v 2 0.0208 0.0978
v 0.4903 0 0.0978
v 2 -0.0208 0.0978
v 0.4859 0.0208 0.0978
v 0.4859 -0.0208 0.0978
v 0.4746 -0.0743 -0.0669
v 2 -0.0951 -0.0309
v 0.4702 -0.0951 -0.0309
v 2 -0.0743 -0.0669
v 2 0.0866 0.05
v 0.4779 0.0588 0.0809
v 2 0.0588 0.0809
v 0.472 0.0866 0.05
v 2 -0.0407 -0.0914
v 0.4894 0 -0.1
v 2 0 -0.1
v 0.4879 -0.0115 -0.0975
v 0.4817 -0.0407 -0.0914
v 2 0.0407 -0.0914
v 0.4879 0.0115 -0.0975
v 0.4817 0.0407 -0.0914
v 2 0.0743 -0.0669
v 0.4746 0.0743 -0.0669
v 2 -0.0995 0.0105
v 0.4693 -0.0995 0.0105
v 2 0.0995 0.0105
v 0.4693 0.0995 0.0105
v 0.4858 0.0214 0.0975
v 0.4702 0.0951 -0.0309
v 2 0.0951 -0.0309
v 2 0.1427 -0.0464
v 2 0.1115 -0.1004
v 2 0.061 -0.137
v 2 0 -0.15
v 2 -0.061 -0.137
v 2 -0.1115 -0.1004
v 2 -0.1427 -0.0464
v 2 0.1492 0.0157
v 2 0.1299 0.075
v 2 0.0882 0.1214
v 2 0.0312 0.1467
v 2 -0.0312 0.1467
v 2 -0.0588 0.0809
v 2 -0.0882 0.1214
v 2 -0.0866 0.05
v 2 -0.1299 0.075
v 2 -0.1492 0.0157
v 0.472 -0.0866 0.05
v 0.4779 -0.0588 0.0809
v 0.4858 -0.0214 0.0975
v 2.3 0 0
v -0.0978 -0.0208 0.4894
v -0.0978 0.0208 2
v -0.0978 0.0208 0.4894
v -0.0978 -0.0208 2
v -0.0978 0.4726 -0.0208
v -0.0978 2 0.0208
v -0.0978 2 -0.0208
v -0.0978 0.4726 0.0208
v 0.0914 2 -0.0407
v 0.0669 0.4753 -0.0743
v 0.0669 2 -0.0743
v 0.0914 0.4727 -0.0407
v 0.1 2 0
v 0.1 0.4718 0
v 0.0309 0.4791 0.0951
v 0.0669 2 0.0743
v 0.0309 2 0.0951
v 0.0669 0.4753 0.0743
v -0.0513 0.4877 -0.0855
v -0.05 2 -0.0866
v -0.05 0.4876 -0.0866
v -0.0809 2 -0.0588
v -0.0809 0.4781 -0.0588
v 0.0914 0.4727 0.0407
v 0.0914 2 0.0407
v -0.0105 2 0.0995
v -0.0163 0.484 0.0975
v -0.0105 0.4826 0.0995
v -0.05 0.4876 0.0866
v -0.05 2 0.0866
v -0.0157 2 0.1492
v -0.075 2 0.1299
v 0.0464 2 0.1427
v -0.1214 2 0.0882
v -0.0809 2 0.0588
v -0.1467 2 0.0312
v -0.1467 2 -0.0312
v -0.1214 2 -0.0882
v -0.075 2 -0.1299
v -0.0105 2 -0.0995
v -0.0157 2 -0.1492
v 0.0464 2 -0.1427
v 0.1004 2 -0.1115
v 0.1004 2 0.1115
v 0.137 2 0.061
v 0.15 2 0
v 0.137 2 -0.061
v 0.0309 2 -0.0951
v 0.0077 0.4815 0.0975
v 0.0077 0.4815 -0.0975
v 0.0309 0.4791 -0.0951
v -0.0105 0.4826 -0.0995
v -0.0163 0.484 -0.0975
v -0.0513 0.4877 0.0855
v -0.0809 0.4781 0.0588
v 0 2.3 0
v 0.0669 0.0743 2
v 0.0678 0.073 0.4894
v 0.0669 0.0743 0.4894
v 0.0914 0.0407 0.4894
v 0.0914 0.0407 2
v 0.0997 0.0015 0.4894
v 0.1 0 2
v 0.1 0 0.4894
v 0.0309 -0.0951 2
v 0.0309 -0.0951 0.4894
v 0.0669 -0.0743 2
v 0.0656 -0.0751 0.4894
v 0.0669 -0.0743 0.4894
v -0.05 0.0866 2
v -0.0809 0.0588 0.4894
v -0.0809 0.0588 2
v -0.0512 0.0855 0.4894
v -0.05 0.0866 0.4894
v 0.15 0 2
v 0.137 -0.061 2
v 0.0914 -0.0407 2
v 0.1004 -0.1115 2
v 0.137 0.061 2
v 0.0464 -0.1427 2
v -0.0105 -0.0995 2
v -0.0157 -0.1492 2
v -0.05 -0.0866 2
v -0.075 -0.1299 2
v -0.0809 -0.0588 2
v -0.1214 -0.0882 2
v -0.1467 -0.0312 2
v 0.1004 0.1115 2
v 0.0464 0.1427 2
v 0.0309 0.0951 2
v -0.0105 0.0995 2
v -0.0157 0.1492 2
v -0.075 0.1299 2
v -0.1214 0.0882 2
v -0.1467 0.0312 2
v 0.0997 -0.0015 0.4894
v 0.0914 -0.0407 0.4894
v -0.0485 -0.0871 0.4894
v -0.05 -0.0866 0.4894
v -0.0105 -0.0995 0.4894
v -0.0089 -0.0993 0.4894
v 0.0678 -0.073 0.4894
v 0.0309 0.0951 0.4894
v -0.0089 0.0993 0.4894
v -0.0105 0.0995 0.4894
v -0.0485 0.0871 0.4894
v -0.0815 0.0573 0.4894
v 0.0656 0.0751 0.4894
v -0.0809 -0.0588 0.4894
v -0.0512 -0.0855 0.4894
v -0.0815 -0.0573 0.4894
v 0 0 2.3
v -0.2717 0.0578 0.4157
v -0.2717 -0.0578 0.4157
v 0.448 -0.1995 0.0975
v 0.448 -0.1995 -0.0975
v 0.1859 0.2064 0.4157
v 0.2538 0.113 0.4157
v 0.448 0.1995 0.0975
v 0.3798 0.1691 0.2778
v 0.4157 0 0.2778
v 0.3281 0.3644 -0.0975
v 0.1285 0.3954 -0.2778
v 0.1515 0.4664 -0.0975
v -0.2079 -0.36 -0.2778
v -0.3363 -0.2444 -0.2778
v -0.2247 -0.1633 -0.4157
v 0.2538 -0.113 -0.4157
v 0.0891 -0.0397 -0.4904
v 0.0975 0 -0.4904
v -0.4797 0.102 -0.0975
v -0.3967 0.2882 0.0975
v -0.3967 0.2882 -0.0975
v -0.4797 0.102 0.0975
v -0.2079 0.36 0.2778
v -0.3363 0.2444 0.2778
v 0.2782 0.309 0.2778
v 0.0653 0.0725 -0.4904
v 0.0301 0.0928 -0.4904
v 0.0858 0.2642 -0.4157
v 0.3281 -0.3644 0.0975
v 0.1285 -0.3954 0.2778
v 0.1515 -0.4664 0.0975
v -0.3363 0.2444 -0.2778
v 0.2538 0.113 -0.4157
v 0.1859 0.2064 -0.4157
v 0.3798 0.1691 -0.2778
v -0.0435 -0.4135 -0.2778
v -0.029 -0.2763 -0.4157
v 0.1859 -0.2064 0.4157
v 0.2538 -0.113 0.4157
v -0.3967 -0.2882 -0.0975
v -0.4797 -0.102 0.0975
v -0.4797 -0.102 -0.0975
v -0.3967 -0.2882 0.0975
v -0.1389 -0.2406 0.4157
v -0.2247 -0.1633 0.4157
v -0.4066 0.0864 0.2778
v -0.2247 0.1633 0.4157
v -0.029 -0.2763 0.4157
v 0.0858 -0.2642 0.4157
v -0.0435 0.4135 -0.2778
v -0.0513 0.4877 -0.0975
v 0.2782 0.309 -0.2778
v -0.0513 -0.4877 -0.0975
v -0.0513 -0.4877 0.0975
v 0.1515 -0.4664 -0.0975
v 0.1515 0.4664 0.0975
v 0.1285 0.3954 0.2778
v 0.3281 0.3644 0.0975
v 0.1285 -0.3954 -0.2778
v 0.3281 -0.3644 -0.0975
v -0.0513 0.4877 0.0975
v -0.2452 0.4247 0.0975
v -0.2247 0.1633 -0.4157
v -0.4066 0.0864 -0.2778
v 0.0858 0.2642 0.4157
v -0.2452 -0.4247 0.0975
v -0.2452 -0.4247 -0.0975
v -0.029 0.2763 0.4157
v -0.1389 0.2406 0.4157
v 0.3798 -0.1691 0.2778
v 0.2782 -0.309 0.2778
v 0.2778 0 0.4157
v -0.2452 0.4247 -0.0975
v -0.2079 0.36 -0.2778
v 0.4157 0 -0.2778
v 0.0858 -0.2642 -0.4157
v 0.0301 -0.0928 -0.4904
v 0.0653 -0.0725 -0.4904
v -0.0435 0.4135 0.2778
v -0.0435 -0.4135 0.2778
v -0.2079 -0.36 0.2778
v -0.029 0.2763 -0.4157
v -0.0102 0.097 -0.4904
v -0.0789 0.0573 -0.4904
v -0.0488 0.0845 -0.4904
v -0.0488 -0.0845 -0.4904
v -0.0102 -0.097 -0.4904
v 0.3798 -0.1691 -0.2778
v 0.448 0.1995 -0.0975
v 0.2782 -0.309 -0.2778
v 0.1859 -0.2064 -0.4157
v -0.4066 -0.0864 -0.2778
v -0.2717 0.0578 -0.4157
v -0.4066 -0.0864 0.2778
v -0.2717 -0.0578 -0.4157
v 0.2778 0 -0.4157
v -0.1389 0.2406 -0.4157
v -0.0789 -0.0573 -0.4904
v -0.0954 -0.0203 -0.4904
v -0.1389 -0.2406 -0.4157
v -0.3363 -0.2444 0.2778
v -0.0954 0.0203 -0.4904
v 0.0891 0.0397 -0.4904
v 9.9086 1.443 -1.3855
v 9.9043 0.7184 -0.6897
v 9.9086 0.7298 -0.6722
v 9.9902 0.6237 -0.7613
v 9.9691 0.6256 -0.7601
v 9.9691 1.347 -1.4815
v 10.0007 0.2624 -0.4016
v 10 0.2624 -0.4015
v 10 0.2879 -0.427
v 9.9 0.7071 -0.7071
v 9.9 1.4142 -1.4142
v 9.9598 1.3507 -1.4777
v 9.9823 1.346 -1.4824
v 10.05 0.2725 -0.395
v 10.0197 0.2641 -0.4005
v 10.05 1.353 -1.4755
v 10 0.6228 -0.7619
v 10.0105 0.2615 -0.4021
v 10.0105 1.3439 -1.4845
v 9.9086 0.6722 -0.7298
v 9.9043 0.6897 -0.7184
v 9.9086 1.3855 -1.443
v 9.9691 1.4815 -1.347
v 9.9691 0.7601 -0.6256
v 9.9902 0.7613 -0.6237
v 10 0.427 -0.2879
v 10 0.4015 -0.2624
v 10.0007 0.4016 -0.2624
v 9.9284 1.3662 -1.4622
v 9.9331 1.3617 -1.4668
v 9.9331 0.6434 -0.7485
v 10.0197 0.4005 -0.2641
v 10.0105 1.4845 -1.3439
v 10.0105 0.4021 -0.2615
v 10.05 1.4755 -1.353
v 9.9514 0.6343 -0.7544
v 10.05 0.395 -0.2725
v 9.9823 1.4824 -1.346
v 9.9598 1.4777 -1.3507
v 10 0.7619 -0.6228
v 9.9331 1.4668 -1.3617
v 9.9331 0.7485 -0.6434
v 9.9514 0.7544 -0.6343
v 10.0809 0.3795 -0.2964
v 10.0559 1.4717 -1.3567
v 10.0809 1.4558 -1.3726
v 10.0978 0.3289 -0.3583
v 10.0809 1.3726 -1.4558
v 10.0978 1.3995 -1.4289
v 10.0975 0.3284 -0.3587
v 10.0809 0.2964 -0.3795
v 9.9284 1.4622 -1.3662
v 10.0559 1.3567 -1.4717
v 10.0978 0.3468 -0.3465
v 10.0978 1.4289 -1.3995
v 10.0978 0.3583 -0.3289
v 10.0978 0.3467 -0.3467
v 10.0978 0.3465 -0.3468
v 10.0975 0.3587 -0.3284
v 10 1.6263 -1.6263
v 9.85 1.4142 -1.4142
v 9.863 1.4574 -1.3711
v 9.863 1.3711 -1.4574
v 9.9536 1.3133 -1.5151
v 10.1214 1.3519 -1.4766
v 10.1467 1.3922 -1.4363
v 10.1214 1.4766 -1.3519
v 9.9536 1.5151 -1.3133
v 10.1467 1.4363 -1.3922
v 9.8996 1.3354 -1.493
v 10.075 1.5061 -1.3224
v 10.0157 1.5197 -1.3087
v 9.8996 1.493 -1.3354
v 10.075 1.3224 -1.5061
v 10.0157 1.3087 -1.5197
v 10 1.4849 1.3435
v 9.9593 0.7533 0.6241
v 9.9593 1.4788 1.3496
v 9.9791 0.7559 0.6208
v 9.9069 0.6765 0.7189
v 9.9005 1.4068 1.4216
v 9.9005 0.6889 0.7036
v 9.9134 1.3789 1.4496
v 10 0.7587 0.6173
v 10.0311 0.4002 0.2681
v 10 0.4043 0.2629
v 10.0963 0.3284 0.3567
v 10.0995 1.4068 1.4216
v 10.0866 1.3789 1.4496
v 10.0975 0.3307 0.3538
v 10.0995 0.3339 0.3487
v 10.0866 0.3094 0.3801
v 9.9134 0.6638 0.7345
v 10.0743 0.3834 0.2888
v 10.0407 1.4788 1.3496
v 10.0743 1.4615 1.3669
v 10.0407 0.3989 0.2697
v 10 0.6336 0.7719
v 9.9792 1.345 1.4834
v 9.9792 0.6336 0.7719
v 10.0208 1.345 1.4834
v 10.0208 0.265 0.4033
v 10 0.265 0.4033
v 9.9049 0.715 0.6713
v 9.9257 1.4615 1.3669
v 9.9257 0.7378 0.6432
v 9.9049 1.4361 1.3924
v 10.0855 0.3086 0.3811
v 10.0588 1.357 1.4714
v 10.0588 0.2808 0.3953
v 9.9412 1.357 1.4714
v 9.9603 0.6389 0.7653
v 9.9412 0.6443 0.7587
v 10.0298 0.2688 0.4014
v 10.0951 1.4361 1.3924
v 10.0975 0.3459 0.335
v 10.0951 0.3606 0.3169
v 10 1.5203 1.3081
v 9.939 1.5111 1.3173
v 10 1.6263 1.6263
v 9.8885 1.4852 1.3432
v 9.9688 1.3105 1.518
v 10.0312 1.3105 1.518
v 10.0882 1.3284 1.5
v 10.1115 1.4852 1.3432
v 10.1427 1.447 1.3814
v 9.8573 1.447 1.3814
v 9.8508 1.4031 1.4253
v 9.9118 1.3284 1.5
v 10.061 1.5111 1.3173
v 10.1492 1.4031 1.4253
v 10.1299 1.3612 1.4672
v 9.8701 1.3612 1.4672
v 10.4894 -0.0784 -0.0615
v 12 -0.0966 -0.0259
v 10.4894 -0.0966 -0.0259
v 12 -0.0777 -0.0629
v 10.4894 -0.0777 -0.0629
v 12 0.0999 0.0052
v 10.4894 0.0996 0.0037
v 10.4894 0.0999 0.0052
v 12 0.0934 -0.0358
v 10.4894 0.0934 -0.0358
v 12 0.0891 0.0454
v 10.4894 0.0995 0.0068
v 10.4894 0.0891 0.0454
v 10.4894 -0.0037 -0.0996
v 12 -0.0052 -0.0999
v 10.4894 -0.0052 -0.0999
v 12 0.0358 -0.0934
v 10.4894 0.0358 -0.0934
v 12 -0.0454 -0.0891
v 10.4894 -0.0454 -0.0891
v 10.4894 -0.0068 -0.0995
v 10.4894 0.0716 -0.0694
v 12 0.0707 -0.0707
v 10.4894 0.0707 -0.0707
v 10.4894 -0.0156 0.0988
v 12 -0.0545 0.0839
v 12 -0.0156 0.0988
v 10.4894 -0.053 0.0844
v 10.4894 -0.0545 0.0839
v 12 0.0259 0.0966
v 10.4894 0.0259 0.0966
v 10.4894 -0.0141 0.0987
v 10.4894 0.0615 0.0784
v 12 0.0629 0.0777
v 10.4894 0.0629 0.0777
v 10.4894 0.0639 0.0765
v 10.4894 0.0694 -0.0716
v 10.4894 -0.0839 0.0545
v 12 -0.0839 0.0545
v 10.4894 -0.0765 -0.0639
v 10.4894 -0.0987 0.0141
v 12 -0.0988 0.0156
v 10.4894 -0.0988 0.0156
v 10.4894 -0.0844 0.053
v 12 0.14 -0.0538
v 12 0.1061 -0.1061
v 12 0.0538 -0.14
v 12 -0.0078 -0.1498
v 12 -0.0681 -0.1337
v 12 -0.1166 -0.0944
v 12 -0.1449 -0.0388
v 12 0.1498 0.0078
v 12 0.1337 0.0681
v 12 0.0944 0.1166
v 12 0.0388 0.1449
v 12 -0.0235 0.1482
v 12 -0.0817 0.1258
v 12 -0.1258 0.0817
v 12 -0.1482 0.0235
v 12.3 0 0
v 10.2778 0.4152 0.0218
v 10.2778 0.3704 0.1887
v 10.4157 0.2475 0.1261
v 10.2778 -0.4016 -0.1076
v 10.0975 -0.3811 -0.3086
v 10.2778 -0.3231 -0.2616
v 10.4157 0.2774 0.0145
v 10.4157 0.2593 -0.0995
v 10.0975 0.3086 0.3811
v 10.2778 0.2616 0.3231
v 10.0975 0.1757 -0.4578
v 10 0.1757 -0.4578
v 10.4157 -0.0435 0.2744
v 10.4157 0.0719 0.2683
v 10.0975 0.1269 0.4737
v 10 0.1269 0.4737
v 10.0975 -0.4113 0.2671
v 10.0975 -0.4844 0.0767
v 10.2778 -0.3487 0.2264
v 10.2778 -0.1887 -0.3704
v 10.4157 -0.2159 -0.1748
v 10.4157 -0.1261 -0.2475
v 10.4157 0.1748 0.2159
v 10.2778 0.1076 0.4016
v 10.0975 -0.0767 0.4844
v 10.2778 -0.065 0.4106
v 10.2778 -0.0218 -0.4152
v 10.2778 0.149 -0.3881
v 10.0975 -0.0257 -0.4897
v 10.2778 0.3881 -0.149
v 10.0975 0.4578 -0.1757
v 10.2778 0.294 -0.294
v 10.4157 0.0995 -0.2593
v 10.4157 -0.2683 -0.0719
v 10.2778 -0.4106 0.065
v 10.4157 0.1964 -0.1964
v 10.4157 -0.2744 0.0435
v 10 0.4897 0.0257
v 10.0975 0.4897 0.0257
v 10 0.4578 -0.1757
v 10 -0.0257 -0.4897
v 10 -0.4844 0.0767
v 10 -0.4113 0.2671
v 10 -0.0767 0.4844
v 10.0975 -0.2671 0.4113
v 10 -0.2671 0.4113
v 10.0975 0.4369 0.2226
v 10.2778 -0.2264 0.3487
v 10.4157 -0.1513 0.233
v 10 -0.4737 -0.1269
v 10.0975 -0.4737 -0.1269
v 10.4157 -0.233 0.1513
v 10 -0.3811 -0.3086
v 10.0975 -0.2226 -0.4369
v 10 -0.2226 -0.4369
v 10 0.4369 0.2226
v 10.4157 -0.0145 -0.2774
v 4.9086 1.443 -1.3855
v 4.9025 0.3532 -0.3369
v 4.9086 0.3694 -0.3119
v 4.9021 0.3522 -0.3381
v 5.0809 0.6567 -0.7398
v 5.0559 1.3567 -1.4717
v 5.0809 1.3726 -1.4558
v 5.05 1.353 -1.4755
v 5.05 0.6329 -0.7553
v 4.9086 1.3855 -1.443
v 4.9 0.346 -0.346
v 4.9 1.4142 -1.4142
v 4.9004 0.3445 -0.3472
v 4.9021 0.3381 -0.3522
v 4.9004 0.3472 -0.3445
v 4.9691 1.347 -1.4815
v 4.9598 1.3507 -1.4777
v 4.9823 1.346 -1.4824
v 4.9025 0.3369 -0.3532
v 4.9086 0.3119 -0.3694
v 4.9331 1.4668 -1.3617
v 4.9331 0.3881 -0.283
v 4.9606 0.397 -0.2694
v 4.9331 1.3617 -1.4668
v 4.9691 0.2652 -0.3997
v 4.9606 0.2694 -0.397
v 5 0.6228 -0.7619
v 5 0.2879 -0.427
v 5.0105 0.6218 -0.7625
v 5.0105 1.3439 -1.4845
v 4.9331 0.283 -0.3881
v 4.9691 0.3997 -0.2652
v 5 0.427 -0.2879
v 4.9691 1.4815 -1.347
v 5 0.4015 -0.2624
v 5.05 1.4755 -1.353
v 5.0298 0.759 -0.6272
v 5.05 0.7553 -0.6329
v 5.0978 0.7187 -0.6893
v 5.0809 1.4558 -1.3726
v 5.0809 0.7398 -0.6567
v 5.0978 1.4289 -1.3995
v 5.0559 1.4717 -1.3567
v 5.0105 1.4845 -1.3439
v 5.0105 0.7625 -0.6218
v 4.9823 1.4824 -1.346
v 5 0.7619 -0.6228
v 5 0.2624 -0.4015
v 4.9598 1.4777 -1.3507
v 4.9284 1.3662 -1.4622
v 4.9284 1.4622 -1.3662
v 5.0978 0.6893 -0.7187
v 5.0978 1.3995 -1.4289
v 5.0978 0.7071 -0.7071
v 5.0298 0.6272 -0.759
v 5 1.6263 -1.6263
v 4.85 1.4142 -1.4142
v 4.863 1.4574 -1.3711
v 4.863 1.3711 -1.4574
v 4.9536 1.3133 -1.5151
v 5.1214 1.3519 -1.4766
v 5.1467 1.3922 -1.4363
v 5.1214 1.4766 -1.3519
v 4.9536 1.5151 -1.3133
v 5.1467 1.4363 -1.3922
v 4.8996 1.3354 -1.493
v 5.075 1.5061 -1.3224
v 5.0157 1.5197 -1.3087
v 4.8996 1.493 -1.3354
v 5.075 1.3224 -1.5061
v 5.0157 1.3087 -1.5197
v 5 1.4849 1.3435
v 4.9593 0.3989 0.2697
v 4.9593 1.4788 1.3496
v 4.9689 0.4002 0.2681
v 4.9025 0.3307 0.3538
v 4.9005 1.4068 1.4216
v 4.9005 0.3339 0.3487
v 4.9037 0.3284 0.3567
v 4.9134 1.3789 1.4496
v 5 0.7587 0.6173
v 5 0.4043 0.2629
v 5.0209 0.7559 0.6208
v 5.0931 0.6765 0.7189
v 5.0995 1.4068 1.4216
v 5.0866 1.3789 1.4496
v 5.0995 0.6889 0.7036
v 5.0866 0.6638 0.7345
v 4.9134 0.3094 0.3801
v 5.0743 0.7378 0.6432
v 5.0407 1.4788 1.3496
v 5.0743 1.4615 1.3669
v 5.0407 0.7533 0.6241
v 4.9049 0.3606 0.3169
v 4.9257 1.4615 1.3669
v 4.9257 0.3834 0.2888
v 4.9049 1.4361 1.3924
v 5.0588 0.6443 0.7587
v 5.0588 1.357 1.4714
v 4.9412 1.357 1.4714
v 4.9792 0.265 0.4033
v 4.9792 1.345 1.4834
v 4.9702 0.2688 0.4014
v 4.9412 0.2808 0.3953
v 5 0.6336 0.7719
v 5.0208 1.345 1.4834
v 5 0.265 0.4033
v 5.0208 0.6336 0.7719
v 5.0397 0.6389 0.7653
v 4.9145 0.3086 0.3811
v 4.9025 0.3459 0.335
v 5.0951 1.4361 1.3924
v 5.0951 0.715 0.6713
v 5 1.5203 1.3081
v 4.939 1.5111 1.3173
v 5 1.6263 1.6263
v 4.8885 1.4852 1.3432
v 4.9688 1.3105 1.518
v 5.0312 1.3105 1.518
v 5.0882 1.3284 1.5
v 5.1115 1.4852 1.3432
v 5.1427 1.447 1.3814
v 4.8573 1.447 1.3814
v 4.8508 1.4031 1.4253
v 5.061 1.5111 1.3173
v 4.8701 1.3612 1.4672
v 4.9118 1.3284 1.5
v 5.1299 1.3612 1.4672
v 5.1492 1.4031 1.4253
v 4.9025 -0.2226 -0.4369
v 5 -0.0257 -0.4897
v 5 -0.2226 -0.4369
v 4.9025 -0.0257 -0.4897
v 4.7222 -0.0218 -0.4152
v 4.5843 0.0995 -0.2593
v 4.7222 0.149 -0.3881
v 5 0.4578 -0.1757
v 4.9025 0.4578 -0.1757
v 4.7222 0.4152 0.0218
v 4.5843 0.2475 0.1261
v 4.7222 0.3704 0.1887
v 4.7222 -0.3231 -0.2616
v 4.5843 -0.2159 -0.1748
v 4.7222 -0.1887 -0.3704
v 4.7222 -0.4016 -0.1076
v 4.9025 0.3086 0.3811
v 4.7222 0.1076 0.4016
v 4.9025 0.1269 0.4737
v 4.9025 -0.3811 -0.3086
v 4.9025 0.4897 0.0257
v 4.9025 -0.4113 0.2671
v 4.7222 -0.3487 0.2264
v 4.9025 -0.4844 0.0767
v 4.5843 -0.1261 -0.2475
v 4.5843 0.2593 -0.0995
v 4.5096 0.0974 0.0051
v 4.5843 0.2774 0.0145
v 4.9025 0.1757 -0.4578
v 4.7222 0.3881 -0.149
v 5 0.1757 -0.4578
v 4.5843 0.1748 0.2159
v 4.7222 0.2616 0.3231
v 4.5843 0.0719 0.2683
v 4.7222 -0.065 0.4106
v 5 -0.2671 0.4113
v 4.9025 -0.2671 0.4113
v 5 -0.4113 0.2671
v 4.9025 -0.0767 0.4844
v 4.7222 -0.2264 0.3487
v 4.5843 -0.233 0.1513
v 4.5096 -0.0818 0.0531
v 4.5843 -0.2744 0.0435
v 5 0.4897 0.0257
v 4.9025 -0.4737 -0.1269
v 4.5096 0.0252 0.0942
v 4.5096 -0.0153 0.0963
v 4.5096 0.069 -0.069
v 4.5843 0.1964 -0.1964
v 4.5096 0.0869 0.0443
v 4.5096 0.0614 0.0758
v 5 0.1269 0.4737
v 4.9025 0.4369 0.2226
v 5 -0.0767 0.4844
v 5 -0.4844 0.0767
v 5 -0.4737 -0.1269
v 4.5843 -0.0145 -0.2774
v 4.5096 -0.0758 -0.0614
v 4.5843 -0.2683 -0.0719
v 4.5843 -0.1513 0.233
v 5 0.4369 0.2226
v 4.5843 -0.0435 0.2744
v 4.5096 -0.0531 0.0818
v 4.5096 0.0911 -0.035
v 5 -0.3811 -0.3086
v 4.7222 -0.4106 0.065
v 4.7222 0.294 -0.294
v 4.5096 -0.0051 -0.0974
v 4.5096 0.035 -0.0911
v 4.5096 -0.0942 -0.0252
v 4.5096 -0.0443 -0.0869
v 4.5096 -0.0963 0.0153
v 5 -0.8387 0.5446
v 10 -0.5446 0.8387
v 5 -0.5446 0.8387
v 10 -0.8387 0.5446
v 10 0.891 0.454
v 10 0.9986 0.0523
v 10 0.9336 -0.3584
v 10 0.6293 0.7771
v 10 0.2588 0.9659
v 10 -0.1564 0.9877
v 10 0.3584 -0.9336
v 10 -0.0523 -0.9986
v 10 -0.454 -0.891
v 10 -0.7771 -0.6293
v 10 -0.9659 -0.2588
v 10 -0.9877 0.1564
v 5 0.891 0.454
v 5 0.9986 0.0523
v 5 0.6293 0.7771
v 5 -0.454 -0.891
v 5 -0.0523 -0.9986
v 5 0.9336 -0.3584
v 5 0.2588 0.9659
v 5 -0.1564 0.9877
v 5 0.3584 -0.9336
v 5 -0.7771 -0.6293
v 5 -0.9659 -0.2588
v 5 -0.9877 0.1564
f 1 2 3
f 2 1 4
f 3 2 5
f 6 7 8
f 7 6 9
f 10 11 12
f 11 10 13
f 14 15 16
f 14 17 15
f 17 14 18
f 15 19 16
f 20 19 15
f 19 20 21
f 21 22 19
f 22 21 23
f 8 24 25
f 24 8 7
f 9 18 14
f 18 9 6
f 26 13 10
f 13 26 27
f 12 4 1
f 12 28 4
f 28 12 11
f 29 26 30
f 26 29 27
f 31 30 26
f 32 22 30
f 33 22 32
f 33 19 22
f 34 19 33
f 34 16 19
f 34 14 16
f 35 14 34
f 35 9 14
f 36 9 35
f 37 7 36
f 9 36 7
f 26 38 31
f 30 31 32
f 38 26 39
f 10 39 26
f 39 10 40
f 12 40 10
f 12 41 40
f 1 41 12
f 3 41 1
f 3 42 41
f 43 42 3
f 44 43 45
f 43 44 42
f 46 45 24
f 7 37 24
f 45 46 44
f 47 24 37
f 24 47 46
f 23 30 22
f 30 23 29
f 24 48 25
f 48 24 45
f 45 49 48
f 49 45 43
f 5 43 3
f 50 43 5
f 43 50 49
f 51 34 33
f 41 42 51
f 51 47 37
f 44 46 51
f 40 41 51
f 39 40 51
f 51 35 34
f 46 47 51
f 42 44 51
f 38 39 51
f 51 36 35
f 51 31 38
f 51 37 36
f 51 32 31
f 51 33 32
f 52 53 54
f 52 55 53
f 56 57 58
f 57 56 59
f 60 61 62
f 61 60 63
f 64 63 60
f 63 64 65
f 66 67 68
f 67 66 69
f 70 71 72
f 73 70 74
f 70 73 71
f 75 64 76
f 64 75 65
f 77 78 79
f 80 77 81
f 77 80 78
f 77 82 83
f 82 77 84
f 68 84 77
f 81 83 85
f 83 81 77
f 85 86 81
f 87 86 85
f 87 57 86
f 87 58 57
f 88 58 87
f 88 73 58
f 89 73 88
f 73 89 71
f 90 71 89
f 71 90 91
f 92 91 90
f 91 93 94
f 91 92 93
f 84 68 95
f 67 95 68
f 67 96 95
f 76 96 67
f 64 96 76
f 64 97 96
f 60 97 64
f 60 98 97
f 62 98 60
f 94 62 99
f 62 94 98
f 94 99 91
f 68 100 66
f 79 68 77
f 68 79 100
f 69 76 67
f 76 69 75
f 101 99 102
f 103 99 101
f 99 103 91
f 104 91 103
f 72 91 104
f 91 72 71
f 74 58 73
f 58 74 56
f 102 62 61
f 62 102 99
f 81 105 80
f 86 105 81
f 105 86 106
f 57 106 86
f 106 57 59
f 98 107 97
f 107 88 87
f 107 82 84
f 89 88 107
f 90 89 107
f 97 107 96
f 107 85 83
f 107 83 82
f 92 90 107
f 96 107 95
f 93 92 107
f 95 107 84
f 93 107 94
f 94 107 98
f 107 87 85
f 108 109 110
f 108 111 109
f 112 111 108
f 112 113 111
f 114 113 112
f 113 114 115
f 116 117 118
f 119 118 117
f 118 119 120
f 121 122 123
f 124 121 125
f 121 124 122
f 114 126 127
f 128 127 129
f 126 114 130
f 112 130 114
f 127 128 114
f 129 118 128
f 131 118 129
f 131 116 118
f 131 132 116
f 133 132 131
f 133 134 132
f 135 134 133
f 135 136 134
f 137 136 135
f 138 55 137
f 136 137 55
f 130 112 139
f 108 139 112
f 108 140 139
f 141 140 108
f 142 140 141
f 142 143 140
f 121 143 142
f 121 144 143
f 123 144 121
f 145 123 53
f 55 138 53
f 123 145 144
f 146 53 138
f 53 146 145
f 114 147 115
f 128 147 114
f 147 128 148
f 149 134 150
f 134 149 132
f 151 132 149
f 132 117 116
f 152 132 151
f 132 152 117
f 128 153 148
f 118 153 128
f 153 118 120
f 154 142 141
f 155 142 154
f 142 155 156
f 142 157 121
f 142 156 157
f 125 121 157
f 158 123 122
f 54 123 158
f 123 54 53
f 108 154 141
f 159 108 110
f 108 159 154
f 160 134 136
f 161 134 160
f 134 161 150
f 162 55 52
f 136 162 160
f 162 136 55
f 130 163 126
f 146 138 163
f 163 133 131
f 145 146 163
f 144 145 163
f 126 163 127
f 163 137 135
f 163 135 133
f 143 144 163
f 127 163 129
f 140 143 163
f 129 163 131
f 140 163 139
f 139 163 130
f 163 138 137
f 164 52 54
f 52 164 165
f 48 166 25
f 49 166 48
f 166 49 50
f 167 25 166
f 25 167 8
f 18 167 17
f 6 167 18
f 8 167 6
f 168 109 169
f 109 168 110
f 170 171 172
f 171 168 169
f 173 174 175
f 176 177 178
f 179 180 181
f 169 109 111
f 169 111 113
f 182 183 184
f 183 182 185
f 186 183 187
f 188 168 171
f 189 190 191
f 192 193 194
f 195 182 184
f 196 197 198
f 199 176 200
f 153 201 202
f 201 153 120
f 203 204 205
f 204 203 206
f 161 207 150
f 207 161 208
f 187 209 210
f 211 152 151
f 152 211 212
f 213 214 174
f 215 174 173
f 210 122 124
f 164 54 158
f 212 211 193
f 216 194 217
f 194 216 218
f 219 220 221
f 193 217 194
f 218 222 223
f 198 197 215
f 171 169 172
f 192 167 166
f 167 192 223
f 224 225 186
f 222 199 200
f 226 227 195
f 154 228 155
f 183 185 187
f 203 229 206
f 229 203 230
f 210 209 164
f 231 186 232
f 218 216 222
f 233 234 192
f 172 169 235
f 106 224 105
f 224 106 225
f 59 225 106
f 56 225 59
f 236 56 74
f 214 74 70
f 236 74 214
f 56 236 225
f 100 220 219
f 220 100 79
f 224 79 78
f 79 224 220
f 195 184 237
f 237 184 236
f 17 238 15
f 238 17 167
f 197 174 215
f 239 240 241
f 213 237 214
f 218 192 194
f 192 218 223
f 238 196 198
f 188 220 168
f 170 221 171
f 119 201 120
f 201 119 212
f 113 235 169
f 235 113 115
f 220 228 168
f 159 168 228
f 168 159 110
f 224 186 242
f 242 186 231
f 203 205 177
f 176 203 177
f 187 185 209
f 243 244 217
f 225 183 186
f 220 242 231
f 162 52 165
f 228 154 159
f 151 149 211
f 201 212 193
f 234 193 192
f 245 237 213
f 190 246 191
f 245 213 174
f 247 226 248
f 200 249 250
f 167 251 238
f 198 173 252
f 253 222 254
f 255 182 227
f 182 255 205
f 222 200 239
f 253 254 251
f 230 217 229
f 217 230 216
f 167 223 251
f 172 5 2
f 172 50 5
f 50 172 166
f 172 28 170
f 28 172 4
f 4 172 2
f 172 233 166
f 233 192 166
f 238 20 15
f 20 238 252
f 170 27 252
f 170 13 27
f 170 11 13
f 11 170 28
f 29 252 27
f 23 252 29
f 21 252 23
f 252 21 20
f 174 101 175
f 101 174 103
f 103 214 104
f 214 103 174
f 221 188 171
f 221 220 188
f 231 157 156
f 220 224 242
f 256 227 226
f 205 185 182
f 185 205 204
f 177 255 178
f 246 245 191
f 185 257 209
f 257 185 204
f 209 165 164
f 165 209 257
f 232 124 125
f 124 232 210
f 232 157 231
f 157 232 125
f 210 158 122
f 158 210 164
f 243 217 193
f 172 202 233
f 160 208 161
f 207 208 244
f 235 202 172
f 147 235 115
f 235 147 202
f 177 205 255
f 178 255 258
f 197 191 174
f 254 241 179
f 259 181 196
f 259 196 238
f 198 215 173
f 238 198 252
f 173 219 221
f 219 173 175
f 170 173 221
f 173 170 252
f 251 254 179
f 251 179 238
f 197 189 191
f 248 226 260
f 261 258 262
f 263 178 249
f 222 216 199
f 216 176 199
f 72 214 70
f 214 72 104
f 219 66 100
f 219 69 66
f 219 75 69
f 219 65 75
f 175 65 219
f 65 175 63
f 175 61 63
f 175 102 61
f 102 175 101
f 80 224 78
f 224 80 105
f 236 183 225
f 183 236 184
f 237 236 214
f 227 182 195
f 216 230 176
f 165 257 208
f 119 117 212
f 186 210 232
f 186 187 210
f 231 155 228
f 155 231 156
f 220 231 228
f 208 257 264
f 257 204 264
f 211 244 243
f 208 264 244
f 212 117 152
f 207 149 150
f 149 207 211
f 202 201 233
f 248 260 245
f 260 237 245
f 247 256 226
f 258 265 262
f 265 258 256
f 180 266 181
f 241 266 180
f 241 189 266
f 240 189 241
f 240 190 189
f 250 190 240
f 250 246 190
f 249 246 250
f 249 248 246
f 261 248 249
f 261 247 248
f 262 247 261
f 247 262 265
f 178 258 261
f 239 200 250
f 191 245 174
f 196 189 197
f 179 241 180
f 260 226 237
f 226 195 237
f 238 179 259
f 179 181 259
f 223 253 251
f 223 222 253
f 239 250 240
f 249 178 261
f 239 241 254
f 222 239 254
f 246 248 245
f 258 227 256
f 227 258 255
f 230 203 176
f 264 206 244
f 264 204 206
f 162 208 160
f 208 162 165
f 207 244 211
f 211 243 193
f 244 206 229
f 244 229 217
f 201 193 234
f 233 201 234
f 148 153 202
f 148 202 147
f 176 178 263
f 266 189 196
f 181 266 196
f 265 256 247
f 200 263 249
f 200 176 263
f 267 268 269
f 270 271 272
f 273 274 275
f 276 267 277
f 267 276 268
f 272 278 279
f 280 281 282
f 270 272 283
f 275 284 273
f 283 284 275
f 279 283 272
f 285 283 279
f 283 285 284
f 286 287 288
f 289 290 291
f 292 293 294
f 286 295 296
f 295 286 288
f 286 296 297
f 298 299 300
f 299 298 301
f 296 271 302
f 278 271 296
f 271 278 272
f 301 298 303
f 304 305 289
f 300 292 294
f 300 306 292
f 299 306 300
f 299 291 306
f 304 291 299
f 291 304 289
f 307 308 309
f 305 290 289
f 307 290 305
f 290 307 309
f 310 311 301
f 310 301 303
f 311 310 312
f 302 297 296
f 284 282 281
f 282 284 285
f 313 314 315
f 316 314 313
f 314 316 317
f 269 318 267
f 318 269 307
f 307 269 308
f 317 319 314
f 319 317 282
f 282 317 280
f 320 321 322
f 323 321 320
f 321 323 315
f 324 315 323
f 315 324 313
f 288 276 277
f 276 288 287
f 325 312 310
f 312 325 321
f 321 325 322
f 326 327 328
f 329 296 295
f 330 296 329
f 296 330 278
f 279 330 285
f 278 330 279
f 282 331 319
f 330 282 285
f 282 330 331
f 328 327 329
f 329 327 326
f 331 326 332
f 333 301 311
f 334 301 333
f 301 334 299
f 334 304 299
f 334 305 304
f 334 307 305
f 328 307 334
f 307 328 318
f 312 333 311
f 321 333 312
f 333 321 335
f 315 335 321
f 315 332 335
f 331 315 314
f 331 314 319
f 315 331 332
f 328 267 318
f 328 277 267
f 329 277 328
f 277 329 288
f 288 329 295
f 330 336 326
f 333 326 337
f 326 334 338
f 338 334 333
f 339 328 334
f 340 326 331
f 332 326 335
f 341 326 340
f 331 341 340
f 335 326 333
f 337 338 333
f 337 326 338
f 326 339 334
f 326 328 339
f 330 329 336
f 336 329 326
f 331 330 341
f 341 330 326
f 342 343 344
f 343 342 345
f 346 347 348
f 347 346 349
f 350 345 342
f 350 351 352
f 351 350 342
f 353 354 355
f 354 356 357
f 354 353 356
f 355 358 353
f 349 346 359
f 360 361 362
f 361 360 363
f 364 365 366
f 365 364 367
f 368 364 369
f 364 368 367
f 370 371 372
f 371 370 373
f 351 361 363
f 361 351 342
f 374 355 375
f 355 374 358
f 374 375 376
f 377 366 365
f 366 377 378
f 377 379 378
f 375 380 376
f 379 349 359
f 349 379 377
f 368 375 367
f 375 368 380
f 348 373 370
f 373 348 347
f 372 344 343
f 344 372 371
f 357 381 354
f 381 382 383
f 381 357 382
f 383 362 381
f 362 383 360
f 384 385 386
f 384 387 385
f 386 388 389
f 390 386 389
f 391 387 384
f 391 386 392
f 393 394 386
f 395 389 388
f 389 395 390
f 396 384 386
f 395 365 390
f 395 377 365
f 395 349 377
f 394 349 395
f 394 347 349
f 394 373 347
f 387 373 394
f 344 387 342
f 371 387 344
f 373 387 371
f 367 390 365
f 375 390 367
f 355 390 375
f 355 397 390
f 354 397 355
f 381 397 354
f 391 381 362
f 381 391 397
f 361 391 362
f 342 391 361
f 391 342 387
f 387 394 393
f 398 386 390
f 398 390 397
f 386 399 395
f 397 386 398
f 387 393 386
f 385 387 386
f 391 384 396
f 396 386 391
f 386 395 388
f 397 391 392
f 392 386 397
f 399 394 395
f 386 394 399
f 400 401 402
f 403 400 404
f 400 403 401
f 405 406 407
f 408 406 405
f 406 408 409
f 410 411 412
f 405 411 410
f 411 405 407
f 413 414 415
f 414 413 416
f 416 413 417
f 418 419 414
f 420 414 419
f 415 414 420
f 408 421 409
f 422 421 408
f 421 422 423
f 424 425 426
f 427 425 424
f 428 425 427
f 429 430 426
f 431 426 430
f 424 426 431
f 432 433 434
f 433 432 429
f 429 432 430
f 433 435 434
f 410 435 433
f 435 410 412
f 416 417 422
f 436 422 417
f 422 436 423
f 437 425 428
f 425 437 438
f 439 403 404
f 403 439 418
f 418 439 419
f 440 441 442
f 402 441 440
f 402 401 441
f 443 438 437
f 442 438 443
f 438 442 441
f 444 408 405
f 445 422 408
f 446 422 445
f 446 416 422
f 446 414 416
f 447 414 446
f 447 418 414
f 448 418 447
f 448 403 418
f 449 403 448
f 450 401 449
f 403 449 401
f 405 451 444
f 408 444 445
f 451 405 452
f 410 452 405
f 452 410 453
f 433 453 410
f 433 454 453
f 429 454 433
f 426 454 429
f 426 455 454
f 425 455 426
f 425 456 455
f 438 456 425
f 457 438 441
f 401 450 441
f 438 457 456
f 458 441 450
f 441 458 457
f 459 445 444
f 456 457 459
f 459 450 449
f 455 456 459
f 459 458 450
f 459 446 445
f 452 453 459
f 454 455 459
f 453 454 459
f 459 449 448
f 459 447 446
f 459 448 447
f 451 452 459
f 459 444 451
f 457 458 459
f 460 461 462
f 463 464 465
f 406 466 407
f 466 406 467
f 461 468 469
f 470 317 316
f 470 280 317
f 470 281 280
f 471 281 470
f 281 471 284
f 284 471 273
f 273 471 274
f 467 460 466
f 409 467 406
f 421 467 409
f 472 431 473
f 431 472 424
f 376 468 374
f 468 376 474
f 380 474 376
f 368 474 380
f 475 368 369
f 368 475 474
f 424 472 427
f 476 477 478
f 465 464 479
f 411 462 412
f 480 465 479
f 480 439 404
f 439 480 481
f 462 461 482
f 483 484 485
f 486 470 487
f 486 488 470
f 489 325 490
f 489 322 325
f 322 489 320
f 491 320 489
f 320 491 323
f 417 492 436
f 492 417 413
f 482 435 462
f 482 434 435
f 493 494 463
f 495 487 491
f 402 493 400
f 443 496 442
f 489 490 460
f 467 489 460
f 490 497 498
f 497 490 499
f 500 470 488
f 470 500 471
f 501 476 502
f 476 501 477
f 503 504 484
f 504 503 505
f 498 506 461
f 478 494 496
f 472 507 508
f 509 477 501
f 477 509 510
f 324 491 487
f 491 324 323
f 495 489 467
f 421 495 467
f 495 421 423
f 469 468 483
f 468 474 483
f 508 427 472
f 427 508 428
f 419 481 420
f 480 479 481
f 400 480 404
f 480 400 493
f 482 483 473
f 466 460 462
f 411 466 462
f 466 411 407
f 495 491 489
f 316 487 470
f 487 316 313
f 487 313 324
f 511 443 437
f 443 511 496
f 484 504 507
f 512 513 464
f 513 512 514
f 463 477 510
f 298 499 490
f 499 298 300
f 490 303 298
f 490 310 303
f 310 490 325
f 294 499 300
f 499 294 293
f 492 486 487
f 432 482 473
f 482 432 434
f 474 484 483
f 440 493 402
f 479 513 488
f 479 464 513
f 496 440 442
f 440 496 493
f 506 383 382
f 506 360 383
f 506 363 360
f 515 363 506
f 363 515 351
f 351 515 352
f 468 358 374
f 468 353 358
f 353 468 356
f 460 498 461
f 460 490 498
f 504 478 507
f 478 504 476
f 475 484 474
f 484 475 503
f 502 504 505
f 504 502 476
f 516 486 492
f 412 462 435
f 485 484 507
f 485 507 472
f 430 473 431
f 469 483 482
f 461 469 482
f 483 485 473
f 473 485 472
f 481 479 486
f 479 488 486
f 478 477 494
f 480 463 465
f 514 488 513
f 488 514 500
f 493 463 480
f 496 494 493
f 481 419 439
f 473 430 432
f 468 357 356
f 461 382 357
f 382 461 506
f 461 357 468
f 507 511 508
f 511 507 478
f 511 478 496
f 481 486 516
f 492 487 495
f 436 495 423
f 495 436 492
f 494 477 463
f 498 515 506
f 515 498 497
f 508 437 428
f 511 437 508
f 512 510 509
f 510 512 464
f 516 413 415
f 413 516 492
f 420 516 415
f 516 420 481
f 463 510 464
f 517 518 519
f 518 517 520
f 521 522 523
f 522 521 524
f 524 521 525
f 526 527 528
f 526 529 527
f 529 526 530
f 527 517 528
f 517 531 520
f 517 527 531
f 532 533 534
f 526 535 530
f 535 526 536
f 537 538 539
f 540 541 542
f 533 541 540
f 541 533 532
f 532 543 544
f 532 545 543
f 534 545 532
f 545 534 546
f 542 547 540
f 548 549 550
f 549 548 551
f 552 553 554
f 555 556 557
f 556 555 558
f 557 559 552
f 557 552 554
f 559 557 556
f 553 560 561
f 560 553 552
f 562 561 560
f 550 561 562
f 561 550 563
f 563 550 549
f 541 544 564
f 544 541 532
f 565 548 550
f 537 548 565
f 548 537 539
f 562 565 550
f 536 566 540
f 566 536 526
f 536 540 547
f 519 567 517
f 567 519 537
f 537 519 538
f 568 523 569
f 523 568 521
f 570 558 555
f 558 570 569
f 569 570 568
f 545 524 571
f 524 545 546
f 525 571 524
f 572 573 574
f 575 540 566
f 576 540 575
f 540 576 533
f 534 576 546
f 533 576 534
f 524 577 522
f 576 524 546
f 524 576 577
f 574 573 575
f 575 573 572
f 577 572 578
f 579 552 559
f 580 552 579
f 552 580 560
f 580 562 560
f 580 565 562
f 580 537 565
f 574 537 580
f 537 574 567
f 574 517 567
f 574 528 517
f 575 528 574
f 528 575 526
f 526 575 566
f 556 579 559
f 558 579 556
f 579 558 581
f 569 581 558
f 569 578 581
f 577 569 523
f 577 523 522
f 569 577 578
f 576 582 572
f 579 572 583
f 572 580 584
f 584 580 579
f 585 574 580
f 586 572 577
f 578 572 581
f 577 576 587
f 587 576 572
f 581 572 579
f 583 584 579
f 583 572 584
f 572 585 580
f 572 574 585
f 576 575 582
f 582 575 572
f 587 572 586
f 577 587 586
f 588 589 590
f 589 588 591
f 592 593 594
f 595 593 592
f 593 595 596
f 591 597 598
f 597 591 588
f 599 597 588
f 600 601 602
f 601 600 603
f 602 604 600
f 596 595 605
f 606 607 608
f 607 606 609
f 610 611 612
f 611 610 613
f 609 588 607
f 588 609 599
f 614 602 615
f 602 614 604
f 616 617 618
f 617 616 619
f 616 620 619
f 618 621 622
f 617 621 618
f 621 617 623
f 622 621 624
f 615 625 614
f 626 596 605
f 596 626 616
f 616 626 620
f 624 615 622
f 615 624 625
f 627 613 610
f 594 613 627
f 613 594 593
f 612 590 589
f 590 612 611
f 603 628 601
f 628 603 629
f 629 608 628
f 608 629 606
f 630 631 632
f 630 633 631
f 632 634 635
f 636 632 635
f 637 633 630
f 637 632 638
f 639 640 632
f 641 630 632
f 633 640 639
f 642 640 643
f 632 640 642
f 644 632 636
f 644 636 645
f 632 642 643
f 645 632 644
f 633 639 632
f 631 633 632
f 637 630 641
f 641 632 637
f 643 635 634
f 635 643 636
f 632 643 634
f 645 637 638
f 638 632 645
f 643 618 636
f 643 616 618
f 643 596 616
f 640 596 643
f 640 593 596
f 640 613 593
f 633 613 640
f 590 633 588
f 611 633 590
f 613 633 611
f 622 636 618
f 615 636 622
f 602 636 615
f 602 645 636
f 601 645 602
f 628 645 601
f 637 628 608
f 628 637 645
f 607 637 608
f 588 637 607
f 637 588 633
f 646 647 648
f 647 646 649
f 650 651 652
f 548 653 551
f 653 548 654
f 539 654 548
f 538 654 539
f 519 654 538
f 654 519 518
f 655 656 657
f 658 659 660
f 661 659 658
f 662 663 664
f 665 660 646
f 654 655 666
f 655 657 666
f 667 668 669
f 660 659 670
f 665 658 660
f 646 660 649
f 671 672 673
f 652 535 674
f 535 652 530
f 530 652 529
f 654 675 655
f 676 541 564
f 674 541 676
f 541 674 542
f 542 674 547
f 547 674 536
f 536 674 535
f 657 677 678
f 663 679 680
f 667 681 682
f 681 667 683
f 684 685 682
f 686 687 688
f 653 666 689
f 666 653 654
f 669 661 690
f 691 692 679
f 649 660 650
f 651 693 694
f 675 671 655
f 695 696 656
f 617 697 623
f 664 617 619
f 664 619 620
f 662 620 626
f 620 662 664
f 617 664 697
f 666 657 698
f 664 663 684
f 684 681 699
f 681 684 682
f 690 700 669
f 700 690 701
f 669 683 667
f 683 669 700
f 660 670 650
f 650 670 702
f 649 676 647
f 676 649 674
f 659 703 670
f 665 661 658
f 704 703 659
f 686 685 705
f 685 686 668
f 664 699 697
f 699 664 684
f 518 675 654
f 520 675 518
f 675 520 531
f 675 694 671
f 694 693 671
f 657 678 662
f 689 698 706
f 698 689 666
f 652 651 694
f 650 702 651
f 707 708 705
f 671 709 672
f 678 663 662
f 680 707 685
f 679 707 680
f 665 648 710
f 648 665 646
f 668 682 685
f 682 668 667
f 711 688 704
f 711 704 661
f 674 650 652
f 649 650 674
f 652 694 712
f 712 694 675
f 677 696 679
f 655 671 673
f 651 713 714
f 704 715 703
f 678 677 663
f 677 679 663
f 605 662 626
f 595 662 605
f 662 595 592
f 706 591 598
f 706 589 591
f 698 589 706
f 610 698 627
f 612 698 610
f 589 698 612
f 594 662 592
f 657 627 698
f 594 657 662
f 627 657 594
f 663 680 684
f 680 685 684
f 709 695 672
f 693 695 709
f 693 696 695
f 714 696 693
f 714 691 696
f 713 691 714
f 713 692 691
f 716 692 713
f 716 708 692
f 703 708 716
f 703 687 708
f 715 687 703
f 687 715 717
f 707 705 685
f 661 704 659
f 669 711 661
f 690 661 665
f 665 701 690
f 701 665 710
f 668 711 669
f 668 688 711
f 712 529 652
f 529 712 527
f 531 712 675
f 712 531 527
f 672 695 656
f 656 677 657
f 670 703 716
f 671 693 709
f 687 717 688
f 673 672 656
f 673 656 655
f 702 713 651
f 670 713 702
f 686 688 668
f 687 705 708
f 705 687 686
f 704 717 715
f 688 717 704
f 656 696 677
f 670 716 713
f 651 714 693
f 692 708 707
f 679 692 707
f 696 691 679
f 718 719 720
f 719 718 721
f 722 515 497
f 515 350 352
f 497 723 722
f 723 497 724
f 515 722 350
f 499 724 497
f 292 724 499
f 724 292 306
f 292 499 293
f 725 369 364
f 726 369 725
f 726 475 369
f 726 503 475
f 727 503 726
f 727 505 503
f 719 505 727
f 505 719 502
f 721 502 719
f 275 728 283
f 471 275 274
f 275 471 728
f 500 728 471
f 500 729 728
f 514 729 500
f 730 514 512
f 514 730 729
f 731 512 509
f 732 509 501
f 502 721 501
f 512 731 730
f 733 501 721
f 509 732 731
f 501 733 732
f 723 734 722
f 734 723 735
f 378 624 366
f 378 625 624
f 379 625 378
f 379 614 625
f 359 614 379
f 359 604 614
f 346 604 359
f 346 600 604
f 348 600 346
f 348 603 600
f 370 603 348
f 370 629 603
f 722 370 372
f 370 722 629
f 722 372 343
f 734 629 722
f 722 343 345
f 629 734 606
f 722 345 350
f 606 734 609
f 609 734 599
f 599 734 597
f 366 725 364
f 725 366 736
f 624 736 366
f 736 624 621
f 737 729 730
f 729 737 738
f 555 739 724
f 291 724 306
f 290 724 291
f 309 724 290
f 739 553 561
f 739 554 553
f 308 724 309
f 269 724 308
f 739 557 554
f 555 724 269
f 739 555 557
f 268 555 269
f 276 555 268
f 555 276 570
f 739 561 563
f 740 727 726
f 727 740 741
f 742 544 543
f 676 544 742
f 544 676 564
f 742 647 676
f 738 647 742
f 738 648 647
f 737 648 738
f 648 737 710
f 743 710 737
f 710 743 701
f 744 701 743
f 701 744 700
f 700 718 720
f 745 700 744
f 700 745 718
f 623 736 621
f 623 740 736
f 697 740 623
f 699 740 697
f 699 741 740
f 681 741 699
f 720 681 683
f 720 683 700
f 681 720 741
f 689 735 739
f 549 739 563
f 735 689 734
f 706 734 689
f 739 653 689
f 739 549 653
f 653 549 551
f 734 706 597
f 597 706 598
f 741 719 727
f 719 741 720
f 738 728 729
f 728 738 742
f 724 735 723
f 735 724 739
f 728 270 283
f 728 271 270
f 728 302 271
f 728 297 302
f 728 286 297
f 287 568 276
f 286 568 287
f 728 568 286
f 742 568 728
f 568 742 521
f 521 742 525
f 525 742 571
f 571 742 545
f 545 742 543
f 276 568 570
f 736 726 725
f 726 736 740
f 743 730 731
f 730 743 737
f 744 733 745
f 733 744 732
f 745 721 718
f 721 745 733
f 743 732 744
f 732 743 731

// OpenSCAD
$fn = 15;


union() {
	union() {
		sphere(d = 1.0000000000);
		color(c = [1.0000000000, 0.0000000000, 0.0000000000]) {
			union() {
				rotate(a = -90.0, v = [0.0, -1.0, 0.0]) {
					cylinder(center = false, d1 = 0.2000000000, d2 = 0.2000000000, h = 2.0000000000);
				}
				rotate(a = -90.0, v = [0.0, -1.0, 0.0]) {
					translate(v = [-0.0, -0.0, 2.0]) {
						cylinder(center = false, d1 = 0.3000000000, d2 = 0.0000000000, h = 0.3000000000);
					}
				}
			}
		}
		color(c = [0.0000000000, 1.0000000000, 0.0000000000]) {
			union() {
				rotate(a = -90.0, v = [1.0, 0.0, 0.0]) {
					cylinder(center = false, d1 = 0.2000000000, d2 = 0.2000000000, h = 2.0000000000);
				}
				rotate(a = -90.0, v = [1.0, 0.0, 0.0]) {
					translate(v = [-0.0, -0.0, 2.0]) {
						cylinder(center = false, d1 = 0.3000000000, d2 = 0.0000000000, h = 0.3000000000);
					}
				}
			}
		}
		color(c = [0.0000000000, 0.0000000000, 1.0000000000]) {
			union() {
				cylinder(center = false, d1 = 0.2000000000, d2 = 0.2000000000, h = 2.0000000000);
				translate(v = [-0.0, -0.0, 2.0]) {
					cylinder(center = false, d1 = 0.3000000000, d2 = 0.0000000000, h = 0.3000000000);
				}
			}
		}
	}
	union() {
		translate(v = [10.0, -2.164890140588733e-16, 2.1648901405887336e-16]) {
			rotate(a = -45.0, v = [-1.0, 2.5363265666181665e-17, -6.123233995736766e-17]) {
				rotate(a = -90.0, v = [-4.329780281177466e-17, -1.0, 0.0]) {
					sphere(d = 1.0000000000);
				}
			}
		}
		color(c = [1.0000000000, 0.0000000000, 0.0000000000]) {
			union() {
				translate(v = [10.0, -2.164890140588733e-16, 2.1648901405887336e-16]) {
					rotate(a = -45.0, v = [-1.0, 2.5363265666181665e-17, -6.123233995736766e-17]) {
						rotate(a = -90.0, v = [-4.329780281177466e-17, -1.0, 0.0]) {
							rotate(a = -90.0, v = [0.0, -1.0, 0.0]) {
								cylinder(center = false, d1 = 0.2000000000, d2 = 0.2000000000, h = 2.0000000000);
							}
						}
					}
				}
				translate(v = [10.0, -2.164890140588733e-16, 2.1648901405887336e-16]) {
					rotate(a = -45.0, v = [-1.0, 2.5363265666181665e-17, -6.123233995736766e-17]) {
						rotate(a = -90.0, v = [-4.329780281177466e-17, -1.0, 0.0]) {
							rotate(a = -90.0, v = [0.0, -1.0, 0.0]) {
								translate(v = [-0.0, -0.0, 2.0]) {
									cylinder(center = false, d1 = 0.3000000000, d2 = 0.0000000000, h = 0.3000000000);
								}
							}
						}
					}
				}
			}
		}
		color(c = [0.0000000000, 1.0000000000, 0.0000000000]) {
			union() {
				translate(v = [10.0, -2.164890140588733e-16, 2.1648901405887336e-16]) {
					rotate(a = -45.0, v = [-1.0, 2.5363265666181665e-17, -6.123233995736766e-17]) {
						rotate(a = -90.0, v = [-4.329780281177466e-17, -1.0, 0.0]) {
							rotate(a = -90.0, v = [1.0, 0.0, 0.0]) {
								cylinder(center = false, d1 = 0.2000000000, d2 = 0.2000000000, h = 2.0000000000);
							}
						}
					}
				}
				translate(v = [10.0, -2.164890140588733e-16, 2.1648901405887336e-16]) {
					rotate(a = -45.0, v = [-1.0, 2.5363265666181665e-17, -6.123233995736766e-17]) {
						rotate(a = -90.0, v = [-4.329780281177466e-17, -1.0, 0.0]) {
							rotate(a = -90.0, v = [1.0, 0.0, 0.0]) {
								translate(v = [-0.0, -0.0, 2.0]) {
									cylinder(center = false, d1 = 0.3000000000, d2 = 0.0000000000, h = 0.3000000000);
								}
							}
						}
					}
				}
			}
		}
		color(c = [0.0000000000, 0.0000000000, 1.0000000000]) {
			union() {
				translate(v = [10.0, -2.164890140588733e-16, 2.1648901405887336e-16]) {
					rotate(a = -45.0, v = [-1.0, 2.5363265666181665e-17, -6.123233995736766e-17]) {
						rotate(a = -90.0, v = [-4.329780281177466e-17, -1.0, 0.0]) {
							cylinder(center = false, d1 = 0.2000000000, d2 = 0.2000000000, h = 2.0000000000);
						}
					}
				}
				translate(v = [10.0, -2.164890140588733e-16, 2.1648901405887336e-16]) {
					rotate(a = -45.0, v = [-1.0, 2.5363265666181665e-17, -6.123233995736766e-17]) {
						rotate(a = -90.0, v = [-4.329780281177466e-17, -1.0, 0.0]) {
							translate(v = [-0.0, -0.0, 2.0]) {
								cylinder(center = false, d1 = 0.3000000000, d2 = 0.0000000000, h = 0.3000000000);
							}
						}
					}
				}
			}
		}
	}
	union() {
		translate(v = [5.0, -0.0, -0.0]) {
			rotate(a = -45.0, v = [-1.0, 2.5363265666181665e-17, -6.123233995736766e-17]) {
				rotate(a = -90.0, v = [-4.329780281177466e-17, -1.0, 0.0]) {
					sphere(d = 1.0000000000);
				}
			}
		}
		color(c = [1.0000000000, 0.0000000000, 0.0000000000]) {
			union() {
				translate(v = [5.0, -0.0, -0.0]) {
					rotate(a = -45.0, v = [-1.0, 2.5363265666181665e-17, -6.123233995736766e-17]) {
						rotate(a = -90.0, v = [-4.329780281177466e-17, -1.0, 0.0]) {
							rotate(a = -90.0, v = [0.0, -1.0, 0.0]) {
								cylinder(center = false, d1 = 0.2000000000, d2 = 0.2000000000, h = 2.0000000000);
							}
						}
					}
				}
				translate(v = [5.0, -0.0, -0.0]) {
					rotate(a = -45.0, v = [-1.0, 2.5363265666181665e-17, -6.123233995736766e-17]) {
						rotate(a = -90.0, v = [-4.329780281177466e-17, -1.0, 0.0]) {
							rotate(a = -90.0, v = [0.0, -1.0, 0.0]) {
								translate(v = [-0.0, -0.0, 2.0]) {
									cylinder(center = false, d1 = 0.3000000000, d2 = 0.0000000000, h = 0.3000000000);
								}
							}
						}
					}
				}
			}
		}
		color(c = [0.0000000000, 1.0000000000, 0.0000000000]) {
			union() {
				translate(v = [5.0, -0.0, -0.0]) {
					rotate(a = -45.0, v = [-1.0, 2.5363265666181665e-17, -6.123233995736766e-17]) {
						rotate(a = -90.0, v = [-4.329780281177466e-17, -1.0, 0.0]) {
							rotate(a = -90.0, v = [1.0, 0.0, 0.0]) {
								cylinder(center = false, d1 = 0.2000000000, d2 = 0.2000000000, h = 2.0000000000);
							}
						}
					}
				}
				translate(v = [5.0, -0.0, -0.0]) {
					rotate(a = -45.0, v = [-1.0, 2.5363265666181665e-17, -6.123233995736766e-17]) {
						rotate(a = -90.0, v = [-4.329780281177466e-17, -1.0, 0.0]) {
							rotate(a = -90.0, v = [1.0, 0.0, 0.0]) {
								translate(v = [-0.0, -0.0, 2.0]) {
									cylinder(center = false, d1 = 0.3000000000, d2 = 0.0000000000, h = 0.3000000000);
								}
							}
						}
					}
				}
			}
		}
		color(c = [0.0000000000, 0.0000000000, 1.0000000000]) {
			union() {
				translate(v = [5.0, -0.0, -0.0]) {
					rotate(a = -45.0, v = [-1.0, 2.5363265666181665e-17, -6.123233995736766e-17]) {
						rotate(a = -90.0, v = [-4.329780281177466e-17, -1.0, 0.0]) {
							cylinder(center = false, d1 = 0.2000000000, d2 = 0.2000000000, h = 2.0000000000);
						}
					}
				}
				translate(v = [5.0, -0.0, -0.0]) {
					rotate(a = -45.0, v = [-1.0, 2.5363265666181665e-17, -6.123233995736766e-17]) {
						rotate(a = -90.0, v = [-4.329780281177466e-17, -1.0, 0.0]) {
							translate(v = [-0.0, -0.0, 2.0]) {
								cylinder(center = false, d1 = 0.3000000000, d2 = 0.0000000000, h = 0.3000000000);
							}
						}
					}
				}
			}
		}
	}
	color(c = [1.0000000000, 1.0000000000, 1.0000000000, 0.5000000000]) {
		translate(v = [5, 0, 0]) {
			rotate(a = [45.0000000000, 0.0000000000, 0.0000000000]) {
				rotate(a = [0.0000000000, 90.0000000000, 0.0000000000]) {
					cylinder(center = false, d1 = 2, d2 = 2, h = 5);
				}
			}
		}
	}
}
